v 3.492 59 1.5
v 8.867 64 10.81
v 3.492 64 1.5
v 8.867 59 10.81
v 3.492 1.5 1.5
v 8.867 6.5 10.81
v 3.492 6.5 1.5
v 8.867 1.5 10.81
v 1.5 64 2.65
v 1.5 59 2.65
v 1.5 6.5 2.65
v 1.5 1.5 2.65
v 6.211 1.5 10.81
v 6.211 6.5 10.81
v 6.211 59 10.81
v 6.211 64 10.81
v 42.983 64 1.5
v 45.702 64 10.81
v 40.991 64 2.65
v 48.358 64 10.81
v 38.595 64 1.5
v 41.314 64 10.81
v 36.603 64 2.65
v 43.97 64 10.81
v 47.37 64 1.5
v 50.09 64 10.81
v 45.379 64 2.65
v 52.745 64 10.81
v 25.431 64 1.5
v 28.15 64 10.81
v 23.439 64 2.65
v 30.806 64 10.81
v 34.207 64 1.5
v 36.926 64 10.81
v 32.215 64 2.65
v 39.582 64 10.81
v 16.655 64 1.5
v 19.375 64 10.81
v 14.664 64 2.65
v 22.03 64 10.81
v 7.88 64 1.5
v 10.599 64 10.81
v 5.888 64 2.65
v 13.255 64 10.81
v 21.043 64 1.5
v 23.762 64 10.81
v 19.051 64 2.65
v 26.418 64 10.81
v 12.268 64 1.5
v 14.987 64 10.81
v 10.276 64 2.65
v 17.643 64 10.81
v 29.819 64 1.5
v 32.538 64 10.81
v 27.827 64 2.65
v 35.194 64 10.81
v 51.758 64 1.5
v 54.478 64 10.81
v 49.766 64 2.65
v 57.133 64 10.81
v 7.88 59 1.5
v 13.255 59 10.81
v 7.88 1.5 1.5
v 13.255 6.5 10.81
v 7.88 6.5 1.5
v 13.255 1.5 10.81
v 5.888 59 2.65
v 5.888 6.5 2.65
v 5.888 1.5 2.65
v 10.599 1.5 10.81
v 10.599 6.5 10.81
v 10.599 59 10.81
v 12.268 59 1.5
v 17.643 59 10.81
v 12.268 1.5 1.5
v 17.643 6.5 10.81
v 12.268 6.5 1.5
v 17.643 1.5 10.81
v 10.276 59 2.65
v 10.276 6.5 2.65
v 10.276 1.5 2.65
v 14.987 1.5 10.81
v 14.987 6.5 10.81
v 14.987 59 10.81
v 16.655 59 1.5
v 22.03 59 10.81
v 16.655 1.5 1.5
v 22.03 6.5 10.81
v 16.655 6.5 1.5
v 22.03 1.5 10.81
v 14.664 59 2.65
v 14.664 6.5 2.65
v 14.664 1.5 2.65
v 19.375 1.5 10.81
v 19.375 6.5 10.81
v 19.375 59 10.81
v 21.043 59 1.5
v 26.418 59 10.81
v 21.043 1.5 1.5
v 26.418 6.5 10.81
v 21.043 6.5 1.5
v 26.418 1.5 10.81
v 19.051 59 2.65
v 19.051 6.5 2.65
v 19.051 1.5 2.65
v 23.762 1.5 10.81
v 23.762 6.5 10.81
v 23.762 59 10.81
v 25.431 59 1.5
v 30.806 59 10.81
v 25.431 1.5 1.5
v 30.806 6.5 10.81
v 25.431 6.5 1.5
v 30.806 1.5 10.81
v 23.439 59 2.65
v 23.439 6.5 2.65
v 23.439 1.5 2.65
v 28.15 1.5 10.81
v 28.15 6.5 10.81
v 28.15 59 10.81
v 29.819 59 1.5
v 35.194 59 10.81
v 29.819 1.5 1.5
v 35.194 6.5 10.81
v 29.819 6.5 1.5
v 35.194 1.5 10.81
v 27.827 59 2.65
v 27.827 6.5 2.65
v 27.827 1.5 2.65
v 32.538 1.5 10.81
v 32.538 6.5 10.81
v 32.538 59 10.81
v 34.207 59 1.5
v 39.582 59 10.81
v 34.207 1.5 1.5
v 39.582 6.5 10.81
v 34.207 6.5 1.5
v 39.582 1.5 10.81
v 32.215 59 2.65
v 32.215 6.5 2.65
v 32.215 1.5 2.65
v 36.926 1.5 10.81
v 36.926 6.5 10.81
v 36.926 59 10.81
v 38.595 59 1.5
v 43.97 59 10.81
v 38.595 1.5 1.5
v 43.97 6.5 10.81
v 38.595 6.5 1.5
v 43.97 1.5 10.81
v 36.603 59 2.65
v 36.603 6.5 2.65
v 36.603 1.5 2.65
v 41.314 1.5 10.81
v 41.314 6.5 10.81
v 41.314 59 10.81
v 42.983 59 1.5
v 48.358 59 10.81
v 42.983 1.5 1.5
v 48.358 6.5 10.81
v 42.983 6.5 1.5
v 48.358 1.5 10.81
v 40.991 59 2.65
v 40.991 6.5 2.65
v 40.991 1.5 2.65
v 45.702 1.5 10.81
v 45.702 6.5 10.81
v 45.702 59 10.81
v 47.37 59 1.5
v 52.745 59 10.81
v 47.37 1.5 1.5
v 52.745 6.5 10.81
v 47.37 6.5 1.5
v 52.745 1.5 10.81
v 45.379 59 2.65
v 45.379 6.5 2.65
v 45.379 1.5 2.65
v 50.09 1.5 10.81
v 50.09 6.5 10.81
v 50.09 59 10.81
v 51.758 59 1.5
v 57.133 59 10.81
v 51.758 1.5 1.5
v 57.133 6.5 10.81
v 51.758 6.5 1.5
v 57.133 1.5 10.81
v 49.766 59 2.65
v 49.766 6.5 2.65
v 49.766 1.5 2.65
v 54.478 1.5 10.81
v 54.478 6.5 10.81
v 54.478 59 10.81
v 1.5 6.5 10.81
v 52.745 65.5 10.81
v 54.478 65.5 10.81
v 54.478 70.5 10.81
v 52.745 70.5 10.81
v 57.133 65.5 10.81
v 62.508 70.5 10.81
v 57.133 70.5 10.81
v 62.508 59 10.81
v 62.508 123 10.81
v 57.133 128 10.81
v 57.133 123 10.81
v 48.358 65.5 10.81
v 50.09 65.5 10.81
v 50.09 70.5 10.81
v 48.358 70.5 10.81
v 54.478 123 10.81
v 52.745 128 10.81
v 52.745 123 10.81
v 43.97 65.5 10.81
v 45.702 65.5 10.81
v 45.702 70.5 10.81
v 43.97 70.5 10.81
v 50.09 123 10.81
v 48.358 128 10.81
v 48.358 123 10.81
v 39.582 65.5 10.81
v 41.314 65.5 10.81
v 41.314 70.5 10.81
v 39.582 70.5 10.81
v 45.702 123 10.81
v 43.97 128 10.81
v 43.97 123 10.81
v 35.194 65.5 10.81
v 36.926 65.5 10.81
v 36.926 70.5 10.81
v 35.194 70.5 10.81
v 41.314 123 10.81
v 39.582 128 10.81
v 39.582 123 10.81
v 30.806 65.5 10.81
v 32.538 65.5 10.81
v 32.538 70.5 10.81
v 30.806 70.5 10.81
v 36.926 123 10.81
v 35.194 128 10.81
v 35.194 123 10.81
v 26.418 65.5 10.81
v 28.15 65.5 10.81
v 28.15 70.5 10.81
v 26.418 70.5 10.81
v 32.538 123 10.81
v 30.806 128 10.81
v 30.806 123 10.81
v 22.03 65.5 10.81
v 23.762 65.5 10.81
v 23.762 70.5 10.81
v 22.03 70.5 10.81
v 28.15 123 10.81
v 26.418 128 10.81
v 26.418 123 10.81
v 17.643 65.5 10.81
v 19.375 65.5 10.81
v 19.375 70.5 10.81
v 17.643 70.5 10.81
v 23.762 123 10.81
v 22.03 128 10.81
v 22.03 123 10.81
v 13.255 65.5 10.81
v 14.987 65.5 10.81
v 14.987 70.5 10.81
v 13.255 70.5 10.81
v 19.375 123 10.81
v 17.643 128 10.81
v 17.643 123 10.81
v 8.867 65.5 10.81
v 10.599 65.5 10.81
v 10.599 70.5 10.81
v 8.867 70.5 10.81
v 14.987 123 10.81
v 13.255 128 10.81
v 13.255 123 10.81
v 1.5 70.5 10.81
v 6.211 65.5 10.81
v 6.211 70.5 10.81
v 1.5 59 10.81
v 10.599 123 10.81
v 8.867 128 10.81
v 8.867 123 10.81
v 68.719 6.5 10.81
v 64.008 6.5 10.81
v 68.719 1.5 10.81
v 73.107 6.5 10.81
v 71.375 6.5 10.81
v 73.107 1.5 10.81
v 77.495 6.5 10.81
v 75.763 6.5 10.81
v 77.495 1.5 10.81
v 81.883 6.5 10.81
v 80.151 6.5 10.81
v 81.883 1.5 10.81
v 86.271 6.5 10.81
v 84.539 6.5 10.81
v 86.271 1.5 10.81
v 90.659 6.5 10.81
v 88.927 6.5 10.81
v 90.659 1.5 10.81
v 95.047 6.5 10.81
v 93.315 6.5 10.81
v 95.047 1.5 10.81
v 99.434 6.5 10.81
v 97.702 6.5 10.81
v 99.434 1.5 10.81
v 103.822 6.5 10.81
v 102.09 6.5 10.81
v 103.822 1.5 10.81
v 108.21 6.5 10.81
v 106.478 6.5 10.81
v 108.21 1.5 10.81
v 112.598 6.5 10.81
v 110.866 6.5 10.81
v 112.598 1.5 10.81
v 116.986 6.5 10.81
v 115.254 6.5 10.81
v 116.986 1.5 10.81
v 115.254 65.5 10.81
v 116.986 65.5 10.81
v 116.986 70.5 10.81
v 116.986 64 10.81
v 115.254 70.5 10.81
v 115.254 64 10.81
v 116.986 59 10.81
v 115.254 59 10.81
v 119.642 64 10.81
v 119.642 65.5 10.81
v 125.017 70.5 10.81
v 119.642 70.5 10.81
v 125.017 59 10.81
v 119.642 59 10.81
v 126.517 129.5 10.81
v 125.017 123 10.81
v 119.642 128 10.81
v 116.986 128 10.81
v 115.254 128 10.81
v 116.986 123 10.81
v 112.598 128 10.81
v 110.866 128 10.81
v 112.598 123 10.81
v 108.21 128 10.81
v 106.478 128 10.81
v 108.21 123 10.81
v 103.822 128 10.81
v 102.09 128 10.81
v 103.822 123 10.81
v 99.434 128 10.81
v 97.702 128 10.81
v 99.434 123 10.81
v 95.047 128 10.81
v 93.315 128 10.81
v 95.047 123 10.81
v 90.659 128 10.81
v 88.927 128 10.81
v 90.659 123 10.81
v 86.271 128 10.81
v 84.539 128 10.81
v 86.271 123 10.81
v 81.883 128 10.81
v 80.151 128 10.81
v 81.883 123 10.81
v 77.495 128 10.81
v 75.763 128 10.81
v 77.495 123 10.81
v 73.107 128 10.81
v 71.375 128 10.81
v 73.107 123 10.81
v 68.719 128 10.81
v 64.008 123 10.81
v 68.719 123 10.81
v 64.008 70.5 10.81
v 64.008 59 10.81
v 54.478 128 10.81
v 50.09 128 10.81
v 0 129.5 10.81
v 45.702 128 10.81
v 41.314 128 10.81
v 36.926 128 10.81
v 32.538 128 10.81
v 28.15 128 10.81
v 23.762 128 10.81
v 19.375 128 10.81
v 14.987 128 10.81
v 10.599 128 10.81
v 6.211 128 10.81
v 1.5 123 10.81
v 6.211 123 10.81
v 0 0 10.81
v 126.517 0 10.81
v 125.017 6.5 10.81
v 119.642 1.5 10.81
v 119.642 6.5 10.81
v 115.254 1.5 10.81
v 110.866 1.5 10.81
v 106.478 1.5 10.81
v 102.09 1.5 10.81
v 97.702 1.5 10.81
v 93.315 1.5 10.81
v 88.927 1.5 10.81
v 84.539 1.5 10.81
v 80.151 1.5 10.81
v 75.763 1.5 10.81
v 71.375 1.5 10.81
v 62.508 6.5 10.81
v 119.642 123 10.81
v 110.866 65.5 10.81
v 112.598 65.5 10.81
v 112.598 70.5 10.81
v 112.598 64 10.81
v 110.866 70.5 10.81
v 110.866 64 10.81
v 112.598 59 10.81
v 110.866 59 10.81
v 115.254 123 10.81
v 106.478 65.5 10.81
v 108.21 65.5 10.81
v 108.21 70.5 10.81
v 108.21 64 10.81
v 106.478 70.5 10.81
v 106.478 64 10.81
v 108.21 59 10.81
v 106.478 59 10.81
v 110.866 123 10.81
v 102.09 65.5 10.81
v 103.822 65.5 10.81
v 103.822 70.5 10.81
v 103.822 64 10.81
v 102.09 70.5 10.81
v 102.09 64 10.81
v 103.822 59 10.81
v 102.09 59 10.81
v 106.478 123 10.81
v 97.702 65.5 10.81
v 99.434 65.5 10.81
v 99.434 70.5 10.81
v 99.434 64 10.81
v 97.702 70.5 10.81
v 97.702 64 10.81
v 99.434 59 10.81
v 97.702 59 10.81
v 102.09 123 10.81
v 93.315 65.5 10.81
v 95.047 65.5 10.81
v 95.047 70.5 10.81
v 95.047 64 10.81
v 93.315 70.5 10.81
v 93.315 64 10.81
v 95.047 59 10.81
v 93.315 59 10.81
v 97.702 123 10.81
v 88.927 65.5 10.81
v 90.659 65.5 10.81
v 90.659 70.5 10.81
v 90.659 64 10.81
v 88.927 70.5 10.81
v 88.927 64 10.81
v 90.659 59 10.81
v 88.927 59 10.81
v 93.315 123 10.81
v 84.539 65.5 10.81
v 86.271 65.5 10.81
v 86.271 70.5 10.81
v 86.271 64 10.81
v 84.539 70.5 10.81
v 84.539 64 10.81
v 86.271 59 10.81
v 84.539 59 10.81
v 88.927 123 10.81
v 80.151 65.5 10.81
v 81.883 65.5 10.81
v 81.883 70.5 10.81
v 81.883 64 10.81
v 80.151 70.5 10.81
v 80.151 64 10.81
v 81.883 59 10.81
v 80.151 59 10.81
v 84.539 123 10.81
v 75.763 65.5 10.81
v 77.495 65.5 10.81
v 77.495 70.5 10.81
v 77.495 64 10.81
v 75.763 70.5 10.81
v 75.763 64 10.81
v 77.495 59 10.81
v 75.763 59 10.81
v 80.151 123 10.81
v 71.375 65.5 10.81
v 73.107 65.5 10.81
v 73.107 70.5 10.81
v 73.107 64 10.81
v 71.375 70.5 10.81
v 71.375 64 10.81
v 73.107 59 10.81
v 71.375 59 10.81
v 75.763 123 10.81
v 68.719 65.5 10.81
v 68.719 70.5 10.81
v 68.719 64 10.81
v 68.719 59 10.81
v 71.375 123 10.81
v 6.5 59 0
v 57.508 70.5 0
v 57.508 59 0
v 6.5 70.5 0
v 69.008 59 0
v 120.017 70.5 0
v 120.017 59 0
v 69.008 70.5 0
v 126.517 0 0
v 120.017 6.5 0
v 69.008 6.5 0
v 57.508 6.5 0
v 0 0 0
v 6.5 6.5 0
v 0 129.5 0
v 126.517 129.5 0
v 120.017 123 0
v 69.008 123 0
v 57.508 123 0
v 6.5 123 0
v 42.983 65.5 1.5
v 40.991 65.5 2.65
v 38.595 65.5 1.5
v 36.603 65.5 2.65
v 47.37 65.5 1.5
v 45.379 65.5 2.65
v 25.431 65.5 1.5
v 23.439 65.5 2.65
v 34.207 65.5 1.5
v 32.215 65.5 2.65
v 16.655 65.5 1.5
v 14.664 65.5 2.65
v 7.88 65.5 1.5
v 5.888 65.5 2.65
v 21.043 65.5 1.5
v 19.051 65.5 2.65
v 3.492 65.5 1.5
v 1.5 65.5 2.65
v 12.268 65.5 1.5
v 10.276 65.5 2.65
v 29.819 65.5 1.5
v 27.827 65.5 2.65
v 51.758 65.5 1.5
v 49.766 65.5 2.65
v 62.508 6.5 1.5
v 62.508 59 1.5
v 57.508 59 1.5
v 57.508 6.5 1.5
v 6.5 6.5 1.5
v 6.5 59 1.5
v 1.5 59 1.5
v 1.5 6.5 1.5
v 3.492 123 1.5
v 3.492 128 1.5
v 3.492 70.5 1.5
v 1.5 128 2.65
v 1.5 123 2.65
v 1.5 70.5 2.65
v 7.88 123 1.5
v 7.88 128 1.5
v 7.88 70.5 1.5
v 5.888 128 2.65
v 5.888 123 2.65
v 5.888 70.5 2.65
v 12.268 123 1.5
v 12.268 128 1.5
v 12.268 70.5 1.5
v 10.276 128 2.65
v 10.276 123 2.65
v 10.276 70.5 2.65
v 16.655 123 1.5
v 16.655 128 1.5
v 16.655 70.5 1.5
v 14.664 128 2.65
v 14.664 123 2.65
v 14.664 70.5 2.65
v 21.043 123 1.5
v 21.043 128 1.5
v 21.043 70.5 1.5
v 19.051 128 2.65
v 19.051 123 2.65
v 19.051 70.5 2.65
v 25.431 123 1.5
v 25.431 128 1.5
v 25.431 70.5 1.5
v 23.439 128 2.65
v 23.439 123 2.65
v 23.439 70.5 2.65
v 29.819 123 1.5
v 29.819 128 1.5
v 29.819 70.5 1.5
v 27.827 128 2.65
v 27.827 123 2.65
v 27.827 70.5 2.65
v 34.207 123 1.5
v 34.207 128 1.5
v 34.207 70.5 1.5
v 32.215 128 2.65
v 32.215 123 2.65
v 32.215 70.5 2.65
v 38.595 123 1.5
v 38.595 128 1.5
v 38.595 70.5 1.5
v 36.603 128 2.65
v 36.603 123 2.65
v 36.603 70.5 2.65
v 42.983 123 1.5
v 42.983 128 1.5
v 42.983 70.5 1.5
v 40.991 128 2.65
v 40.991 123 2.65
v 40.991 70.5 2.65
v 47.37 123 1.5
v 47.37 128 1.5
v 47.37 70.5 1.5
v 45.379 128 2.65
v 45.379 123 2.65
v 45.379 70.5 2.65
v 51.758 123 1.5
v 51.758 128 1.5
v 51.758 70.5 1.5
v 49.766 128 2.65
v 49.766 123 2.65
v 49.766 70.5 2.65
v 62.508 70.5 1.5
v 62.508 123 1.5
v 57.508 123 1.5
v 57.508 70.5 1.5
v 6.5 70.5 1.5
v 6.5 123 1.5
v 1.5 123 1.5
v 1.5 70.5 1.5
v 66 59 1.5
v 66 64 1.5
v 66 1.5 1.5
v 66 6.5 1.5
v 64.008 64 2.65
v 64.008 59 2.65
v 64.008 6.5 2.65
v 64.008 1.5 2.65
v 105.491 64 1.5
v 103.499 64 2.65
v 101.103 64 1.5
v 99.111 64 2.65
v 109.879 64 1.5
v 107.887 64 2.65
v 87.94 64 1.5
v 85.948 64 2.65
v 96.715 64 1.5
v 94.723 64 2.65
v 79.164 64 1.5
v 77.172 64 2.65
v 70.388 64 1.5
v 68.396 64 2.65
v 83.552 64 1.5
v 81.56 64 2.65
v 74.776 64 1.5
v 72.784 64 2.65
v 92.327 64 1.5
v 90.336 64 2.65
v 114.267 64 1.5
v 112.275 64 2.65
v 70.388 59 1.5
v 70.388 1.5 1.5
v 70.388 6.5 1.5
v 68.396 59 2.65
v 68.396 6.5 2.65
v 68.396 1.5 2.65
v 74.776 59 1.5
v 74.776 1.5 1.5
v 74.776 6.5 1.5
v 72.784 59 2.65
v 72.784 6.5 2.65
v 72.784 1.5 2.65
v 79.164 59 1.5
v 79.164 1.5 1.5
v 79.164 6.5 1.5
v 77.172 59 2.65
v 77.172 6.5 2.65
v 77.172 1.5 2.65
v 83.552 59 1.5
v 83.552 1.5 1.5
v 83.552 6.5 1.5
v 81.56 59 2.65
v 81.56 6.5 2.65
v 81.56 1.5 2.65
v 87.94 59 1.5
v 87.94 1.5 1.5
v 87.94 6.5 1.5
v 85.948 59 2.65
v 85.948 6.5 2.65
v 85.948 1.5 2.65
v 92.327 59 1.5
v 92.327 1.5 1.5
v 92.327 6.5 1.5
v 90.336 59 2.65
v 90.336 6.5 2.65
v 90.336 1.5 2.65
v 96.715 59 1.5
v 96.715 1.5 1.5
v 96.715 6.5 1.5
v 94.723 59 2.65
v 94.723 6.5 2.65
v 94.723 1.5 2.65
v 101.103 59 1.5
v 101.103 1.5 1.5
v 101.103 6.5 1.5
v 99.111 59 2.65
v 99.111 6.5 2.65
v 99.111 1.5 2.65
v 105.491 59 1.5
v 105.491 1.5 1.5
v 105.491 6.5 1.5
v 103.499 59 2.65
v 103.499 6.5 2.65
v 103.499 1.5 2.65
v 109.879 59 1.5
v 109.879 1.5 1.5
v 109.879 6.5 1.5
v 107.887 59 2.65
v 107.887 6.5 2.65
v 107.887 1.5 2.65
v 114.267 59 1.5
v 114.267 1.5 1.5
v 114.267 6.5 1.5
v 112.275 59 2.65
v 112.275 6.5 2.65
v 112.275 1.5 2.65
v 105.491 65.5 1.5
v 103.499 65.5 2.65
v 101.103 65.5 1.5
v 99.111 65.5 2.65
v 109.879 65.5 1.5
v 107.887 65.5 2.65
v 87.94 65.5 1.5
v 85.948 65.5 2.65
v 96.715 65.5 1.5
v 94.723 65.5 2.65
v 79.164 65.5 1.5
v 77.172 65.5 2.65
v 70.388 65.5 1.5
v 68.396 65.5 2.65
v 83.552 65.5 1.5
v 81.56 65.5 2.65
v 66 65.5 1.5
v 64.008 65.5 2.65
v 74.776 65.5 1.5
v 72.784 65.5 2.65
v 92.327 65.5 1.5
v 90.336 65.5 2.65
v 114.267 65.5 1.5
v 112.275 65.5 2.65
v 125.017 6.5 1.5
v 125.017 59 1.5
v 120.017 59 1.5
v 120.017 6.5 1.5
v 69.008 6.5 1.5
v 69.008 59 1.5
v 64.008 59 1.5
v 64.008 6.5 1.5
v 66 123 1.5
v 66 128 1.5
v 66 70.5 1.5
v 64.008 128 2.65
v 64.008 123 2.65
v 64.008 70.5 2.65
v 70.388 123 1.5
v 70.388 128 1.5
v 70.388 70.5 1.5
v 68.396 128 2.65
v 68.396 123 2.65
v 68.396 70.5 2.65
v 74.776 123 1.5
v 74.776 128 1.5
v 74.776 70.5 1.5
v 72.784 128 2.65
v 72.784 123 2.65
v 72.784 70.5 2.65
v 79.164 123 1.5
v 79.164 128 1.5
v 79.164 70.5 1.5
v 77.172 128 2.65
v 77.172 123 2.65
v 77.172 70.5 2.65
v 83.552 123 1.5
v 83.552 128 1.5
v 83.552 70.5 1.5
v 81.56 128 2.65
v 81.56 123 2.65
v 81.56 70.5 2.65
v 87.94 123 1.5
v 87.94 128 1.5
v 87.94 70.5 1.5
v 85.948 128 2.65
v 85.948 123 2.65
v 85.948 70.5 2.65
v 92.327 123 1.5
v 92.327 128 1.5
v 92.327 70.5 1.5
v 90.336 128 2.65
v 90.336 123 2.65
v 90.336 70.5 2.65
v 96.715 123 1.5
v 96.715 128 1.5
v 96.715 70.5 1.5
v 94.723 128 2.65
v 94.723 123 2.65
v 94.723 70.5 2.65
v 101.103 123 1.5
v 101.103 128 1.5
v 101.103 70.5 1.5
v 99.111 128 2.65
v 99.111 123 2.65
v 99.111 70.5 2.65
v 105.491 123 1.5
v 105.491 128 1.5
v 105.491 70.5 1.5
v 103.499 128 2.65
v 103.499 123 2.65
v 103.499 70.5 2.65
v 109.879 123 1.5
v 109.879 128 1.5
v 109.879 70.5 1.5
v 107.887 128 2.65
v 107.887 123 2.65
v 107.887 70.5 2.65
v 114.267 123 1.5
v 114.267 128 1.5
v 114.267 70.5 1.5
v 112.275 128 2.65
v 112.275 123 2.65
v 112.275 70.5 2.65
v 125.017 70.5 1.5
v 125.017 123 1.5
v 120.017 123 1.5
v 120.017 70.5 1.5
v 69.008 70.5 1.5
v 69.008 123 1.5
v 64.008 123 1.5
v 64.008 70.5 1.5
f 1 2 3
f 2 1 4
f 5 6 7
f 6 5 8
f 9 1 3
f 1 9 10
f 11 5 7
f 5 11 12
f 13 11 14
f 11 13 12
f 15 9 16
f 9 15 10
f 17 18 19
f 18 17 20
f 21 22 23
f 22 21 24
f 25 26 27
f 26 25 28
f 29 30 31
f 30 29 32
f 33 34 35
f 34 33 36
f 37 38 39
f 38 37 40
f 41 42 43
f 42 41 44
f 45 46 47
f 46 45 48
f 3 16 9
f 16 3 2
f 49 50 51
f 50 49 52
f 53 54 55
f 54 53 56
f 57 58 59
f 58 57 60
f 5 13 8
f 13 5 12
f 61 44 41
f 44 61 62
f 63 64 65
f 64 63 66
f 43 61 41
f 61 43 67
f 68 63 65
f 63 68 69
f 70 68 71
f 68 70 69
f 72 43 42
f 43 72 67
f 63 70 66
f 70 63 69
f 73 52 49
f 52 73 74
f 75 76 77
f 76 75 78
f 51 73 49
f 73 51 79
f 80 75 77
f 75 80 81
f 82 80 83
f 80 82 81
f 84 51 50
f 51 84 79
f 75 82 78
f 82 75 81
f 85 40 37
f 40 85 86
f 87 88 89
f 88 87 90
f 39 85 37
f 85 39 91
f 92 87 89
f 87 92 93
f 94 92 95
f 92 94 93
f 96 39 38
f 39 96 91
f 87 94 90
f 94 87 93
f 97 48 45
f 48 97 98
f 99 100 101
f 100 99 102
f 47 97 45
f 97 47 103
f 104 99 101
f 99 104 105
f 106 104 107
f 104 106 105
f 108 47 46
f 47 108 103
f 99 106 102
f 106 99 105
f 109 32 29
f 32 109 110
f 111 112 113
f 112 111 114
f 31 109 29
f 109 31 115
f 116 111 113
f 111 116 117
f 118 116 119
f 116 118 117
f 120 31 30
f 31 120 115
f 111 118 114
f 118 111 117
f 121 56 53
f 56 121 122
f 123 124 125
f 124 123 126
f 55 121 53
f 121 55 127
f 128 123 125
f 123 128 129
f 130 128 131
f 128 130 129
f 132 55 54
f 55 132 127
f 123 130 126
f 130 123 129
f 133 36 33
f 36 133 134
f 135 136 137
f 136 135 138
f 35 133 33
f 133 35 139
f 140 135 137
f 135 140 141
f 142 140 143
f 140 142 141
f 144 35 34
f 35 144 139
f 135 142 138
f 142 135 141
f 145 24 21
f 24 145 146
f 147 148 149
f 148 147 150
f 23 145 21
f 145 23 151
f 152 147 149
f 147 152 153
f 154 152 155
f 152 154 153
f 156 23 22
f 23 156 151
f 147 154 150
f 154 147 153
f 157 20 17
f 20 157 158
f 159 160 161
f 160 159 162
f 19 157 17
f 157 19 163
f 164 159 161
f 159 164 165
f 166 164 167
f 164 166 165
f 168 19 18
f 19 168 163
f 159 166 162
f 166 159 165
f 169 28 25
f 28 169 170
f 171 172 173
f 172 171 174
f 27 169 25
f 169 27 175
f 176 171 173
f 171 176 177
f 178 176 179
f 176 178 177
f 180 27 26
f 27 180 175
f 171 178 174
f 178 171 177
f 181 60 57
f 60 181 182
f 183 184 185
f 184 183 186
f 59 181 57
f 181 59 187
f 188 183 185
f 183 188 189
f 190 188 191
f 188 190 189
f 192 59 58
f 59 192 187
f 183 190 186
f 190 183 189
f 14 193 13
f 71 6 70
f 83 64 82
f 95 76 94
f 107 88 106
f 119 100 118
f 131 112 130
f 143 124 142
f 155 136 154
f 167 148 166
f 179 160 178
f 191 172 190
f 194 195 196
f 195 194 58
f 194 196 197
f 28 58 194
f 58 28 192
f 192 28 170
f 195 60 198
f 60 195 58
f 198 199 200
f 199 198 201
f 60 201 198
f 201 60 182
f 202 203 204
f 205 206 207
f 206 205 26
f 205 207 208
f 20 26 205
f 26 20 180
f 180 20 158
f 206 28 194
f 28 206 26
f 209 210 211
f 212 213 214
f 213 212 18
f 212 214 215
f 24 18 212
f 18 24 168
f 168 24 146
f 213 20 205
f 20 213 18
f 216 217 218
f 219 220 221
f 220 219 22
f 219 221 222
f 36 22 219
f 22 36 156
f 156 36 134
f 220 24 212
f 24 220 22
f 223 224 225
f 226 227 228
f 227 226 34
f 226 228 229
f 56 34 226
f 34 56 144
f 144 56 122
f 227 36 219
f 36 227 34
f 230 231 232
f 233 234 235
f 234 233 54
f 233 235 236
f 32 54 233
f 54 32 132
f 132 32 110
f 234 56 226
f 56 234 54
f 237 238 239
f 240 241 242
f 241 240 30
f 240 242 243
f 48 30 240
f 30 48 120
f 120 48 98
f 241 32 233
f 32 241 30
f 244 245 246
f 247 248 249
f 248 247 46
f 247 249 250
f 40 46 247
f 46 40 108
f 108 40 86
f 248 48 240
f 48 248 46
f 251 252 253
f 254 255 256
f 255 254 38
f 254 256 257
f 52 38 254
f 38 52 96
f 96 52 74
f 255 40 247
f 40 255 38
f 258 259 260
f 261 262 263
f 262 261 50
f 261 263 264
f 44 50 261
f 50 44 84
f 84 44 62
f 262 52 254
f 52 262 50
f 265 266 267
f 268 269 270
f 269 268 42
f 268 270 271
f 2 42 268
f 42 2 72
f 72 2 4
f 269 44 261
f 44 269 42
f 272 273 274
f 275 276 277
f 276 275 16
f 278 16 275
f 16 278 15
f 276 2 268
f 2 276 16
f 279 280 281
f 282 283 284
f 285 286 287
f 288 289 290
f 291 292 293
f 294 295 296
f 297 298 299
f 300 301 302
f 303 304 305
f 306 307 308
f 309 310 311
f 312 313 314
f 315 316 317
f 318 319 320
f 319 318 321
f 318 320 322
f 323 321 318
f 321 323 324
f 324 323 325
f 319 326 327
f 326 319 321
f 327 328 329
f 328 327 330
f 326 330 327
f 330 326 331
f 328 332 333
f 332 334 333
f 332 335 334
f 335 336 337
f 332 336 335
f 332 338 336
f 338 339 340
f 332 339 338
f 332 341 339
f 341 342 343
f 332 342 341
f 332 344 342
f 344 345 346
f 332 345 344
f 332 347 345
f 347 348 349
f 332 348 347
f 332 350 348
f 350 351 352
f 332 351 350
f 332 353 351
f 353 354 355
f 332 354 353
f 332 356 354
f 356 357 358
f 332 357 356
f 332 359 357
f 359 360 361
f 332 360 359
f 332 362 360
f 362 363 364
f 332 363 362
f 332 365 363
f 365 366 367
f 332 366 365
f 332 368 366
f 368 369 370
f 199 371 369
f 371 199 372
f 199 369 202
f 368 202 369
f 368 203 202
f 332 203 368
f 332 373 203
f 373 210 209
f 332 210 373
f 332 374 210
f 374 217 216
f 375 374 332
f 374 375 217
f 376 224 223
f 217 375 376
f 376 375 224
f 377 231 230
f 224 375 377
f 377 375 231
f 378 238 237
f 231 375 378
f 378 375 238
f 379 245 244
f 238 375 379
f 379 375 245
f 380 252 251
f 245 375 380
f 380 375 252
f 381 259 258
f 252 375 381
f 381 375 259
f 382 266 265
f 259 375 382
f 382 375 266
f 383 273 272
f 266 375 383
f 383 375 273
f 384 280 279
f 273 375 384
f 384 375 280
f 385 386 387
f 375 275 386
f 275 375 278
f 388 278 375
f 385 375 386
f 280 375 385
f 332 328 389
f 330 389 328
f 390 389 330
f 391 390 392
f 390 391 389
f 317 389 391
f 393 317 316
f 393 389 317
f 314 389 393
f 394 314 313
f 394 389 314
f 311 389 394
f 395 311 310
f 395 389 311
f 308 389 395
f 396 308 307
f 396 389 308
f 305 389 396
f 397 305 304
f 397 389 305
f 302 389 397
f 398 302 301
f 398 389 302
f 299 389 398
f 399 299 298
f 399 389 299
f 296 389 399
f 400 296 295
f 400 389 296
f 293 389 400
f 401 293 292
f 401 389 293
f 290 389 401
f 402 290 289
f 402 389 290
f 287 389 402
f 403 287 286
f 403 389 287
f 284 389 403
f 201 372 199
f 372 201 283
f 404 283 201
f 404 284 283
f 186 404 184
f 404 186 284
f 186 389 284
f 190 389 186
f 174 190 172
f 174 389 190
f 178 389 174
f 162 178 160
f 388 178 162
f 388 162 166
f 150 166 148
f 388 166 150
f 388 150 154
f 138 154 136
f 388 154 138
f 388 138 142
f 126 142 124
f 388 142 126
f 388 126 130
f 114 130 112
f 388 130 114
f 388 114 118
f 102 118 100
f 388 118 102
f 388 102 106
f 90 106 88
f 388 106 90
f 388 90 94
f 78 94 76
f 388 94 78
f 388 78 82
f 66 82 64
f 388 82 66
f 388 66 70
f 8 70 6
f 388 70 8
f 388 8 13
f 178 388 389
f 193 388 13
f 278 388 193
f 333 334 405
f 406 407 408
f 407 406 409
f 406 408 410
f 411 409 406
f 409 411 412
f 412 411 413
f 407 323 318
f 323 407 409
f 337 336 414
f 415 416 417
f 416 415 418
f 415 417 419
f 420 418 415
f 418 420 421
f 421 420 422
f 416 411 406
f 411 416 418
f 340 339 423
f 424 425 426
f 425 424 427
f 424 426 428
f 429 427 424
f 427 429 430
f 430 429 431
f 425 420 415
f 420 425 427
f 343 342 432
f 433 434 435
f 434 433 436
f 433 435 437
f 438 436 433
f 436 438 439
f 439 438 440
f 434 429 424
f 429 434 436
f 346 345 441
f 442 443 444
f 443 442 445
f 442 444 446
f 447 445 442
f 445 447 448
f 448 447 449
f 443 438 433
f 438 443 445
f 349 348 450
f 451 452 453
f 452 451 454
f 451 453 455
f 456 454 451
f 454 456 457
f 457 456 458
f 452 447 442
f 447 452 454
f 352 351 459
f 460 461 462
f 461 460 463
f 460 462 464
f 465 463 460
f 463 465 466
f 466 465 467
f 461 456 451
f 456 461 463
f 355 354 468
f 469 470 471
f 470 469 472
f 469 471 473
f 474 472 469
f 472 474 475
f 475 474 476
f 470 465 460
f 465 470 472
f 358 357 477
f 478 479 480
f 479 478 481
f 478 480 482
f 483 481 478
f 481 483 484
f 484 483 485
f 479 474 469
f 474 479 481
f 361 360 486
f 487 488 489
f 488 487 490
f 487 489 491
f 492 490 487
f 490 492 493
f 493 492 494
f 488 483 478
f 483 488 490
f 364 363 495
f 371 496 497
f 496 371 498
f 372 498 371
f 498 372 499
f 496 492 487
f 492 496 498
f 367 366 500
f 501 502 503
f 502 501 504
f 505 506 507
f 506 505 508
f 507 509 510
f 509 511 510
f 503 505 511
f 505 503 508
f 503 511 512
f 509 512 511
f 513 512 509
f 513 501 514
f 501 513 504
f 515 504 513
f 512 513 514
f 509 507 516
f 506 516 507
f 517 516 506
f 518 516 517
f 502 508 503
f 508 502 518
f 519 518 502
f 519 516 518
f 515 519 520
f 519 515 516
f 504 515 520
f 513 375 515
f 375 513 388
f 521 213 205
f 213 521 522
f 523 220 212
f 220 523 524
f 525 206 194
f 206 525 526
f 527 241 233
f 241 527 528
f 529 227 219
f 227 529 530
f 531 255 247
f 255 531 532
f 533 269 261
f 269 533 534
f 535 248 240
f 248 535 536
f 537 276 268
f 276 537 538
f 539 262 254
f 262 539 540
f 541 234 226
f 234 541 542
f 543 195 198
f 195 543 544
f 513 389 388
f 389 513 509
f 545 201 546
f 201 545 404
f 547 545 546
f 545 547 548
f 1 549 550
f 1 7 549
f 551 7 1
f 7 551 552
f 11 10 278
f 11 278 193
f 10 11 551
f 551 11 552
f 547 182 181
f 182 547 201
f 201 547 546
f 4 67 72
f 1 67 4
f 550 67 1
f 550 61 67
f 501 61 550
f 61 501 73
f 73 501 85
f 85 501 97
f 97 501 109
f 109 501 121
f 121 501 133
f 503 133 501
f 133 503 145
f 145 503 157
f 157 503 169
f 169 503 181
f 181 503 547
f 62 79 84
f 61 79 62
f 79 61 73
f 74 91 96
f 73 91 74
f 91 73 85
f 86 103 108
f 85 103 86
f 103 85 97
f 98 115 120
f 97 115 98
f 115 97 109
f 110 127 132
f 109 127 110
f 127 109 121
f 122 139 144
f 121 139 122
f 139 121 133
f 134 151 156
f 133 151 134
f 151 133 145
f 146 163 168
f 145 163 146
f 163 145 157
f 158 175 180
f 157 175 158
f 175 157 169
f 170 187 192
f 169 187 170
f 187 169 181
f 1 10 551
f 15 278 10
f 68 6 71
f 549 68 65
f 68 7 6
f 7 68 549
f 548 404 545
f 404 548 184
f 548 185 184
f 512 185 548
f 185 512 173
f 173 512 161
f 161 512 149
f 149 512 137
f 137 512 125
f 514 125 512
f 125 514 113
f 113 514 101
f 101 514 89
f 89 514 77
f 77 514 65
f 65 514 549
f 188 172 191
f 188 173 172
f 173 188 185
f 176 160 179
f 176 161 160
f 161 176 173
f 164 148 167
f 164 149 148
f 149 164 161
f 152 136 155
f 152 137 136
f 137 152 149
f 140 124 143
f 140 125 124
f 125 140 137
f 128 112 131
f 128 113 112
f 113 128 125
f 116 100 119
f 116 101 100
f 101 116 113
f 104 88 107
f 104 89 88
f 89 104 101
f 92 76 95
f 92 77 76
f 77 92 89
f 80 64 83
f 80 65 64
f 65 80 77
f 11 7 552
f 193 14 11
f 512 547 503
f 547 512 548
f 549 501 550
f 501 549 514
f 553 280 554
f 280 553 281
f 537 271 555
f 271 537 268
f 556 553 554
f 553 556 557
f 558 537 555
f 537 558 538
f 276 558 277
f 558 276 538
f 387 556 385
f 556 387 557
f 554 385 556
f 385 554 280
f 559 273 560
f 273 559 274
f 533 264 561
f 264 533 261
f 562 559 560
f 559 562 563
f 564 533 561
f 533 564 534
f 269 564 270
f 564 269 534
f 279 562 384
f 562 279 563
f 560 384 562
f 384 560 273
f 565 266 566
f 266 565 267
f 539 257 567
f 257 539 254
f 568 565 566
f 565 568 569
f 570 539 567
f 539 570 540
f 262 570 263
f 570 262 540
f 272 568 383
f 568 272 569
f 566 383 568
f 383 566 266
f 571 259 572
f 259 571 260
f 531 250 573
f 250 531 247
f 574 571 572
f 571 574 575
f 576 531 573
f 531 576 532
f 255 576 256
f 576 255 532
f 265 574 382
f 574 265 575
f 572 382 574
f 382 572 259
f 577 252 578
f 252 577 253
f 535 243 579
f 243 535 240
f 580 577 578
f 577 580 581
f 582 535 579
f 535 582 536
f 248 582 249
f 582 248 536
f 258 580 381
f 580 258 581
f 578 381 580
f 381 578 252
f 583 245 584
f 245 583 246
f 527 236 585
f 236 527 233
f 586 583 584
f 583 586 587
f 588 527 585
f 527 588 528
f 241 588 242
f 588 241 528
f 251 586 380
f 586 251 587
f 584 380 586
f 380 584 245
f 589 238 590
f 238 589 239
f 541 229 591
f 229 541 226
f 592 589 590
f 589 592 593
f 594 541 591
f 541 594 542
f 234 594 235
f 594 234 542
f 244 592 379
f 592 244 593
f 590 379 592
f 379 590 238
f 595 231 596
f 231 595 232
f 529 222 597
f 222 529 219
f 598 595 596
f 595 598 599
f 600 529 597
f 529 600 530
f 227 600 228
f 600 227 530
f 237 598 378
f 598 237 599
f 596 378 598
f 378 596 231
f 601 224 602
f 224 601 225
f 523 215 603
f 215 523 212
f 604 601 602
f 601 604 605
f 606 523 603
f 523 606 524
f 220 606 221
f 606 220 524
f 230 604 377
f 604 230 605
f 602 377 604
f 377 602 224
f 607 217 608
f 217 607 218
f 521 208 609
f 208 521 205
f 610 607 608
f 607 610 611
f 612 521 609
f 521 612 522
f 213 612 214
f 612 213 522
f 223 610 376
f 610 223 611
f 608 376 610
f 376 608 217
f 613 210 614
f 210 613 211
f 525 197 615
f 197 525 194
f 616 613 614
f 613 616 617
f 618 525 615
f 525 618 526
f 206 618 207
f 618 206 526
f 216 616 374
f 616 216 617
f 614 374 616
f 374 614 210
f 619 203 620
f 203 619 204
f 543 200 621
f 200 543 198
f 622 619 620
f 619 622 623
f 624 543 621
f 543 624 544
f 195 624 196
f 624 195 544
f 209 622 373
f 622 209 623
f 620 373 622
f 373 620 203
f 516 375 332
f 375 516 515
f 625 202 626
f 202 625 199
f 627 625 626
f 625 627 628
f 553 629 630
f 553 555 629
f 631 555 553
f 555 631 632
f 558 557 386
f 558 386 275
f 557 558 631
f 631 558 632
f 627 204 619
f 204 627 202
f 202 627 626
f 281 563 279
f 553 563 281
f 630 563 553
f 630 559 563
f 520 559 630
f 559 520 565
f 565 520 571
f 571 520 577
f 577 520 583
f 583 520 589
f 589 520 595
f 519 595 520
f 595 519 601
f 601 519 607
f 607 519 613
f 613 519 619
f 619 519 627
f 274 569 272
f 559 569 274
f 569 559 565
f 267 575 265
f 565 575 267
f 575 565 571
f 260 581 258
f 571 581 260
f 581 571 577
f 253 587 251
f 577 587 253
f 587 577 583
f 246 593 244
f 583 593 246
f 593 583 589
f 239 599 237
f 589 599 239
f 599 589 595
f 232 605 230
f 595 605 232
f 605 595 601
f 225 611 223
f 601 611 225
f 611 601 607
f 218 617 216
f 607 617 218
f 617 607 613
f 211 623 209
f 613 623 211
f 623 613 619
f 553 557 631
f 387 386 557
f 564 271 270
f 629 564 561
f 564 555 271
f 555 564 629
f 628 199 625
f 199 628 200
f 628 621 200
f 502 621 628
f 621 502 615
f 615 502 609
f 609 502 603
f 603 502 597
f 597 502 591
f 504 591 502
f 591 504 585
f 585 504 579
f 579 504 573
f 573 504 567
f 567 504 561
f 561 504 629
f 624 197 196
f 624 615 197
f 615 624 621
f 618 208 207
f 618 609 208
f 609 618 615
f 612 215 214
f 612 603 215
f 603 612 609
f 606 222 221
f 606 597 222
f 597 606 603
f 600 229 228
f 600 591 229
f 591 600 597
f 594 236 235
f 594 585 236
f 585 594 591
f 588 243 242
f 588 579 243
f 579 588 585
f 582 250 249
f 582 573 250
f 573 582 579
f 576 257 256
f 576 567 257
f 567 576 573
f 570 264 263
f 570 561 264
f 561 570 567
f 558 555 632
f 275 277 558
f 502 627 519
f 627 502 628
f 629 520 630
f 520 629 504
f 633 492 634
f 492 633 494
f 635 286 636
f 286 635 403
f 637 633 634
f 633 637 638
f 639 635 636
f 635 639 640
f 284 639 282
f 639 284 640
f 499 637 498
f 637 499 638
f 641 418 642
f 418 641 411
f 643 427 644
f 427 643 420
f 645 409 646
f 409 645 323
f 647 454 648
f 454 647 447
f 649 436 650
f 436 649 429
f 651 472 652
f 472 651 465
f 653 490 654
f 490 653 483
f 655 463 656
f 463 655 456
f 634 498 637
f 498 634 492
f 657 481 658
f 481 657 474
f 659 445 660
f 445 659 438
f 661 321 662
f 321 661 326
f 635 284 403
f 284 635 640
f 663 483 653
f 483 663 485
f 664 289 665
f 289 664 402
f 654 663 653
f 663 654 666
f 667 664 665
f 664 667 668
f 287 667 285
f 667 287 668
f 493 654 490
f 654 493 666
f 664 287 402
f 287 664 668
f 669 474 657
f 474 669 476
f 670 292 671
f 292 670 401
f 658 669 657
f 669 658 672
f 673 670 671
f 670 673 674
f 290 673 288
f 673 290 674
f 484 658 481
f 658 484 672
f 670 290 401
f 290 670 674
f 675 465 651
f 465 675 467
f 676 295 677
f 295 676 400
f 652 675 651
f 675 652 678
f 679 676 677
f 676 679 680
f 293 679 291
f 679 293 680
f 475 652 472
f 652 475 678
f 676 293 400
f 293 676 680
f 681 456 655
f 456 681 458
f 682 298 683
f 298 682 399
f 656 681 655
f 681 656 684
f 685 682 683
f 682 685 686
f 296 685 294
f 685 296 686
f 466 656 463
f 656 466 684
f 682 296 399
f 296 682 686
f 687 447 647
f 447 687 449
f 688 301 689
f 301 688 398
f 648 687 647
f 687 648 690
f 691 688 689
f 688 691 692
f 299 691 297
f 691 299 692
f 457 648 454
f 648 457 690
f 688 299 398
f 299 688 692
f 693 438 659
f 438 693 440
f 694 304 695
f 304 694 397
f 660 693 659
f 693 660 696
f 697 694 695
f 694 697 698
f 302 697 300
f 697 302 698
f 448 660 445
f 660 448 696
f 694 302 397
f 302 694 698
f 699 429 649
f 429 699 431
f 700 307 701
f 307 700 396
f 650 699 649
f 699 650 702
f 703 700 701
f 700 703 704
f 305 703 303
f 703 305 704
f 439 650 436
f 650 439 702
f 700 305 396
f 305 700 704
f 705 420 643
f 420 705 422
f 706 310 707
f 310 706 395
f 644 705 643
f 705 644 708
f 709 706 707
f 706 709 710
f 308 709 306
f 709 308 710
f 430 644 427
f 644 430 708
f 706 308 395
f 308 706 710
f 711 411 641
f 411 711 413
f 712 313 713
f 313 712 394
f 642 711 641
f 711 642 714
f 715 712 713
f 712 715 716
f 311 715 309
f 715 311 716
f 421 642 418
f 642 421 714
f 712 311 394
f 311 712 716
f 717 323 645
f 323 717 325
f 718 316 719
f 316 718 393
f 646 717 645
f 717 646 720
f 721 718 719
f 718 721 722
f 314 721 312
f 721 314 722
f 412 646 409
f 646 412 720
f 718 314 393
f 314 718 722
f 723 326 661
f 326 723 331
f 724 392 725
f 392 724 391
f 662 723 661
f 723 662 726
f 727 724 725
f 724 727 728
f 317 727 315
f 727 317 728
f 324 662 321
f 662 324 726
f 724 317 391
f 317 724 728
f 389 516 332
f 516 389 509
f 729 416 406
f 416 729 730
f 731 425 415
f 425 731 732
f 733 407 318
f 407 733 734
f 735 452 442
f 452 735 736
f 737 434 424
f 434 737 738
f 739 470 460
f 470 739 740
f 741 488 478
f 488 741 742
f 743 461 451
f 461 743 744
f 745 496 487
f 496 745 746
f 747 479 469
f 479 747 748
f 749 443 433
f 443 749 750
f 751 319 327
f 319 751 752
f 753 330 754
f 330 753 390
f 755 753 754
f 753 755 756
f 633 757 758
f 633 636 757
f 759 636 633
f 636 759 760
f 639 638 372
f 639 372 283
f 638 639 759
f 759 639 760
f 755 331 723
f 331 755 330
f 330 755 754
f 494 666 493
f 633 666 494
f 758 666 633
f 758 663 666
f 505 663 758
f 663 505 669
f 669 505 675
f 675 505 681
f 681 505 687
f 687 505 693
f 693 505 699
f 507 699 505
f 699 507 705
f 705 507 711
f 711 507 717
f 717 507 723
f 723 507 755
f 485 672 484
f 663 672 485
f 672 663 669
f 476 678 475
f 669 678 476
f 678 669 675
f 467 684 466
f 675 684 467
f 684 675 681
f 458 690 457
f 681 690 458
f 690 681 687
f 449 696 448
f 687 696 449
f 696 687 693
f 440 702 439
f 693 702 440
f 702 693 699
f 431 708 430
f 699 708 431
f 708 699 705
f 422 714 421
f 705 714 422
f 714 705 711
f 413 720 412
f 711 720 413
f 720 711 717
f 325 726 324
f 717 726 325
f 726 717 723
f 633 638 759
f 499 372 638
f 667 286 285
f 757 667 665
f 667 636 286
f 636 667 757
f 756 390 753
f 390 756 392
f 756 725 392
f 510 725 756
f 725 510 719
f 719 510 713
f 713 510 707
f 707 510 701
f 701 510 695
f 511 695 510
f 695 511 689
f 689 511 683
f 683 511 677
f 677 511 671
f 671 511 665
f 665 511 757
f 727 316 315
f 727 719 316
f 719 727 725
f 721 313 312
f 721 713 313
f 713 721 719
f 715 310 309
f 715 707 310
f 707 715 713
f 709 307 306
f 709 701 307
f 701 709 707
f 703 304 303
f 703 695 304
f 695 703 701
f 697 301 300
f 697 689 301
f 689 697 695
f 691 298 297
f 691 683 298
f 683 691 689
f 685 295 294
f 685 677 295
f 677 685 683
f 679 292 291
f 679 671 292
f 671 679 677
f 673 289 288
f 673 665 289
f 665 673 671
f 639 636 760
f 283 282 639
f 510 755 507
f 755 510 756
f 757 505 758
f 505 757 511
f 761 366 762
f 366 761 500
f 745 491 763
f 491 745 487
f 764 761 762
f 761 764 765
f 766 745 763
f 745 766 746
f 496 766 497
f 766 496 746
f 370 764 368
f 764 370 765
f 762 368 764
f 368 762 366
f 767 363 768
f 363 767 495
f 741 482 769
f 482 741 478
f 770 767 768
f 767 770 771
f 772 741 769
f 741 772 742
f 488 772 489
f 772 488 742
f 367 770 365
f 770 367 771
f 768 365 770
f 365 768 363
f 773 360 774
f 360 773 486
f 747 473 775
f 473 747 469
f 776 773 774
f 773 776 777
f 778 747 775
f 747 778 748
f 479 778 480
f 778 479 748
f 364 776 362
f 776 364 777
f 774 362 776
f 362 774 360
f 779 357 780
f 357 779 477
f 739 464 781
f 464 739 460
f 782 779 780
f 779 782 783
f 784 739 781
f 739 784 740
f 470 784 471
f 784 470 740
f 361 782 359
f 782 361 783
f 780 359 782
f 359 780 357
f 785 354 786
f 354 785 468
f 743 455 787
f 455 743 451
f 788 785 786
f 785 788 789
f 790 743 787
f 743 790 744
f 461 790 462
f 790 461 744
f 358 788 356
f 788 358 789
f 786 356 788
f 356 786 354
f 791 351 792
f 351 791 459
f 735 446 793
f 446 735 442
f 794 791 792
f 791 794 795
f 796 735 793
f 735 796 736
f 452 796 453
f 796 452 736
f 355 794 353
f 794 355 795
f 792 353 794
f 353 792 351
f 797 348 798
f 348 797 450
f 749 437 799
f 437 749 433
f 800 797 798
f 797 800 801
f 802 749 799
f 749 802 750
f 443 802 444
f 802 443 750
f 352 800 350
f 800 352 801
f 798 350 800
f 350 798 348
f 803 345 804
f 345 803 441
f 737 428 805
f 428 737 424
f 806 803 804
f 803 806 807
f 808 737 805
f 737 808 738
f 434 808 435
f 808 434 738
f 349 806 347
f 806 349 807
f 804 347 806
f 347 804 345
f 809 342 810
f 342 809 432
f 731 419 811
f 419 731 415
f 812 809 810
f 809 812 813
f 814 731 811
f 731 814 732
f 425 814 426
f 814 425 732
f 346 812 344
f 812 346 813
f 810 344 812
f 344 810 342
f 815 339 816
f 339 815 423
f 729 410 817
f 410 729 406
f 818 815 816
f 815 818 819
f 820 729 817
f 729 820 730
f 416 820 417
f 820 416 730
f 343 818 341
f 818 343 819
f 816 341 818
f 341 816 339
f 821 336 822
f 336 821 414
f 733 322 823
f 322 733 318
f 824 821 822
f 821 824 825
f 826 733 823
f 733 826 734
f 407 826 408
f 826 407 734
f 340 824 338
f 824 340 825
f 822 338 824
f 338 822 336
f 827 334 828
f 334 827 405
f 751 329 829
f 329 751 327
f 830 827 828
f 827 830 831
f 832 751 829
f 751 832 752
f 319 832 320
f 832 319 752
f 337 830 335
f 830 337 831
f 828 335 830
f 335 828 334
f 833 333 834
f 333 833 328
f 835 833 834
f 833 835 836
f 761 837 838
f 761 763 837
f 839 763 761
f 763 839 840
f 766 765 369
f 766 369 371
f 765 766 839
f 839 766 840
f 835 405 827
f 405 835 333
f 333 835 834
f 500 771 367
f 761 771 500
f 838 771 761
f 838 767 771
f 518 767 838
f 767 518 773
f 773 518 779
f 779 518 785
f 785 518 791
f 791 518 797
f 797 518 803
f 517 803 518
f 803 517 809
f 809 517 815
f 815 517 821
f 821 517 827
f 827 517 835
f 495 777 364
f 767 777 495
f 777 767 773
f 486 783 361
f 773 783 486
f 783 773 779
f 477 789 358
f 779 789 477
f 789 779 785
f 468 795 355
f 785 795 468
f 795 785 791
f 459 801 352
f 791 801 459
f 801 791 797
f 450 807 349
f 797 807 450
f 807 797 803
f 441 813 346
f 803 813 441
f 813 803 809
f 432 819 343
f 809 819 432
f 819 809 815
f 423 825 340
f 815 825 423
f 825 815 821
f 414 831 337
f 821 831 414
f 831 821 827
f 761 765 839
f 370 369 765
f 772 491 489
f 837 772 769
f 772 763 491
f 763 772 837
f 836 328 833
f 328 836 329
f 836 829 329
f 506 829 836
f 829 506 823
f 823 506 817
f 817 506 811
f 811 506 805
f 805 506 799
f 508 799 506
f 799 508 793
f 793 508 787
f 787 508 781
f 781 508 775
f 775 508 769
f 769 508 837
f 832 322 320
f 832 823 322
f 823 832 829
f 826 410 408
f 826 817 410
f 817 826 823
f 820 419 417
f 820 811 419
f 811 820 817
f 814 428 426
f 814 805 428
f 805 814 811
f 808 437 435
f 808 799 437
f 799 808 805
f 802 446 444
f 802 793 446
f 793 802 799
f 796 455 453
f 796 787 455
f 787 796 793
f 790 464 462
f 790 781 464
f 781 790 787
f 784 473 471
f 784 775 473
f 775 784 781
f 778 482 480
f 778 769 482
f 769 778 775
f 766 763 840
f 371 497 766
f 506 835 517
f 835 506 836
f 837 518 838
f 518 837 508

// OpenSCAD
// 2017 Pedro Luis Barrio - Mollet
//
// Remixed from
// Lucas Wilder - Michigan Technological University - EE 4777
// Microscope Slide Holder

// number Cols
nCols = 2 ;

// number Rows
nRows = 2;

// Number of slides
slNumber = 12;

// Slide thickness in mm
slThickness = 1.8;

// Slide Thickness Tolerance
slThicknessTol = 0.5;

// Slide spacing
slSpacing = 1.5;

// Slide length in mm
slLength = 61.5;

// Slide Length Tolerance
slLengthTol = 1;

// Slide Angle
slAngle = 30;

// Bottom Length in mm
btLength =  5;

// Bottom Thickness in mm
btThickness = 1.5;

// Slide width in mm
slWidth = 21.5;

// Wall thickness
wThickness = 1.5;


// Calculations
pSlSpacing   = slSpacing / cos (slAngle) ;
pSlThickness = (slThickness + slThicknessTol ) / cos (slAngle) ;

totalWide   =  (slNumber - 1 )* (pSlThickness + pSlSpacing ) + 2 * wThickness + slWidth * sin(slAngle) +  (slThickness + slThicknessTol ) * cos (slAngle)  ;
totalLength = slLength                                             + 2 * wThickness + slLengthTol;
        

for ( i = [ 0 : 1 : nRows -1 ] )
    for ( j = [ 0 : 1 : nCols -1 ] )
        translate ( [ i * (totalWide   - wThickness)    ,
                      j * (totalLength - wThickness)  , 
                      0 ] )
            rack();
   
module rack()
{

    difference()
    {
        // Union of main part to handle mounts
        union()
        {
            // Main body
            cube ( size = [ totalWide,
                            totalLength,
                            (slWidth/2) * cos (slAngle) + btThickness ], 
                   center = false );   
         
            // Slides representation
            for ( i = [ 0 : 1 :slNumber -1 ] )
            {
                translate( [ wThickness + slThicknessTol /2+i * (pSlThickness + pSlSpacing ),
                             wThickness + slLengthTol/2  ,
                             btThickness + (slThickness + slThicknessTol ) * sin (slAngle)    ] ) 
                    rotate([0,slAngle,0])
                    %cube ( size = [ slThickness ,
                                    slLength    ,
                                    slWidth ],
                           center = false);
            }   
            
        }
        
        // Slides with tolerance
        for ( i = [ 0 : 1 :slNumber -1 ] )
        {
            translate( [ wThickness + i * (pSlThickness + pSlSpacing ),
                         wThickness ,
                         btThickness + (slThickness + slThicknessTol ) * sin (slAngle)    ] ) 
                rotate([0,slAngle,0])
                cube ( size = [ slThickness + slThicknessTol,
                                slLength    + slLengthTol,
                                slWidth ],
                       center = false);
        }
        
        // Center cut
        translate ( [ wThickness , 
                      wThickness + btLength,
                      btThickness ] )
                  cube ( size = [ totalWide   - 2 * (wThickness ),
                                  totalLength - 2 * (wThickness + btLength  ),
                            slWidth  + 2 + btThickness ], 
                            center = false);
        // Bottom cut
        translate ( [ wThickness + btLength, 
                      wThickness + btLength,
                      -1 ] )
                  cube ( size = [ totalWide   - 2 * (wThickness + btLength ),
                                  totalLength - 2 * (wThickness + btLength ),
                            slWidth  + 2 + btThickness ], 
                            center = false);        
    }
}
